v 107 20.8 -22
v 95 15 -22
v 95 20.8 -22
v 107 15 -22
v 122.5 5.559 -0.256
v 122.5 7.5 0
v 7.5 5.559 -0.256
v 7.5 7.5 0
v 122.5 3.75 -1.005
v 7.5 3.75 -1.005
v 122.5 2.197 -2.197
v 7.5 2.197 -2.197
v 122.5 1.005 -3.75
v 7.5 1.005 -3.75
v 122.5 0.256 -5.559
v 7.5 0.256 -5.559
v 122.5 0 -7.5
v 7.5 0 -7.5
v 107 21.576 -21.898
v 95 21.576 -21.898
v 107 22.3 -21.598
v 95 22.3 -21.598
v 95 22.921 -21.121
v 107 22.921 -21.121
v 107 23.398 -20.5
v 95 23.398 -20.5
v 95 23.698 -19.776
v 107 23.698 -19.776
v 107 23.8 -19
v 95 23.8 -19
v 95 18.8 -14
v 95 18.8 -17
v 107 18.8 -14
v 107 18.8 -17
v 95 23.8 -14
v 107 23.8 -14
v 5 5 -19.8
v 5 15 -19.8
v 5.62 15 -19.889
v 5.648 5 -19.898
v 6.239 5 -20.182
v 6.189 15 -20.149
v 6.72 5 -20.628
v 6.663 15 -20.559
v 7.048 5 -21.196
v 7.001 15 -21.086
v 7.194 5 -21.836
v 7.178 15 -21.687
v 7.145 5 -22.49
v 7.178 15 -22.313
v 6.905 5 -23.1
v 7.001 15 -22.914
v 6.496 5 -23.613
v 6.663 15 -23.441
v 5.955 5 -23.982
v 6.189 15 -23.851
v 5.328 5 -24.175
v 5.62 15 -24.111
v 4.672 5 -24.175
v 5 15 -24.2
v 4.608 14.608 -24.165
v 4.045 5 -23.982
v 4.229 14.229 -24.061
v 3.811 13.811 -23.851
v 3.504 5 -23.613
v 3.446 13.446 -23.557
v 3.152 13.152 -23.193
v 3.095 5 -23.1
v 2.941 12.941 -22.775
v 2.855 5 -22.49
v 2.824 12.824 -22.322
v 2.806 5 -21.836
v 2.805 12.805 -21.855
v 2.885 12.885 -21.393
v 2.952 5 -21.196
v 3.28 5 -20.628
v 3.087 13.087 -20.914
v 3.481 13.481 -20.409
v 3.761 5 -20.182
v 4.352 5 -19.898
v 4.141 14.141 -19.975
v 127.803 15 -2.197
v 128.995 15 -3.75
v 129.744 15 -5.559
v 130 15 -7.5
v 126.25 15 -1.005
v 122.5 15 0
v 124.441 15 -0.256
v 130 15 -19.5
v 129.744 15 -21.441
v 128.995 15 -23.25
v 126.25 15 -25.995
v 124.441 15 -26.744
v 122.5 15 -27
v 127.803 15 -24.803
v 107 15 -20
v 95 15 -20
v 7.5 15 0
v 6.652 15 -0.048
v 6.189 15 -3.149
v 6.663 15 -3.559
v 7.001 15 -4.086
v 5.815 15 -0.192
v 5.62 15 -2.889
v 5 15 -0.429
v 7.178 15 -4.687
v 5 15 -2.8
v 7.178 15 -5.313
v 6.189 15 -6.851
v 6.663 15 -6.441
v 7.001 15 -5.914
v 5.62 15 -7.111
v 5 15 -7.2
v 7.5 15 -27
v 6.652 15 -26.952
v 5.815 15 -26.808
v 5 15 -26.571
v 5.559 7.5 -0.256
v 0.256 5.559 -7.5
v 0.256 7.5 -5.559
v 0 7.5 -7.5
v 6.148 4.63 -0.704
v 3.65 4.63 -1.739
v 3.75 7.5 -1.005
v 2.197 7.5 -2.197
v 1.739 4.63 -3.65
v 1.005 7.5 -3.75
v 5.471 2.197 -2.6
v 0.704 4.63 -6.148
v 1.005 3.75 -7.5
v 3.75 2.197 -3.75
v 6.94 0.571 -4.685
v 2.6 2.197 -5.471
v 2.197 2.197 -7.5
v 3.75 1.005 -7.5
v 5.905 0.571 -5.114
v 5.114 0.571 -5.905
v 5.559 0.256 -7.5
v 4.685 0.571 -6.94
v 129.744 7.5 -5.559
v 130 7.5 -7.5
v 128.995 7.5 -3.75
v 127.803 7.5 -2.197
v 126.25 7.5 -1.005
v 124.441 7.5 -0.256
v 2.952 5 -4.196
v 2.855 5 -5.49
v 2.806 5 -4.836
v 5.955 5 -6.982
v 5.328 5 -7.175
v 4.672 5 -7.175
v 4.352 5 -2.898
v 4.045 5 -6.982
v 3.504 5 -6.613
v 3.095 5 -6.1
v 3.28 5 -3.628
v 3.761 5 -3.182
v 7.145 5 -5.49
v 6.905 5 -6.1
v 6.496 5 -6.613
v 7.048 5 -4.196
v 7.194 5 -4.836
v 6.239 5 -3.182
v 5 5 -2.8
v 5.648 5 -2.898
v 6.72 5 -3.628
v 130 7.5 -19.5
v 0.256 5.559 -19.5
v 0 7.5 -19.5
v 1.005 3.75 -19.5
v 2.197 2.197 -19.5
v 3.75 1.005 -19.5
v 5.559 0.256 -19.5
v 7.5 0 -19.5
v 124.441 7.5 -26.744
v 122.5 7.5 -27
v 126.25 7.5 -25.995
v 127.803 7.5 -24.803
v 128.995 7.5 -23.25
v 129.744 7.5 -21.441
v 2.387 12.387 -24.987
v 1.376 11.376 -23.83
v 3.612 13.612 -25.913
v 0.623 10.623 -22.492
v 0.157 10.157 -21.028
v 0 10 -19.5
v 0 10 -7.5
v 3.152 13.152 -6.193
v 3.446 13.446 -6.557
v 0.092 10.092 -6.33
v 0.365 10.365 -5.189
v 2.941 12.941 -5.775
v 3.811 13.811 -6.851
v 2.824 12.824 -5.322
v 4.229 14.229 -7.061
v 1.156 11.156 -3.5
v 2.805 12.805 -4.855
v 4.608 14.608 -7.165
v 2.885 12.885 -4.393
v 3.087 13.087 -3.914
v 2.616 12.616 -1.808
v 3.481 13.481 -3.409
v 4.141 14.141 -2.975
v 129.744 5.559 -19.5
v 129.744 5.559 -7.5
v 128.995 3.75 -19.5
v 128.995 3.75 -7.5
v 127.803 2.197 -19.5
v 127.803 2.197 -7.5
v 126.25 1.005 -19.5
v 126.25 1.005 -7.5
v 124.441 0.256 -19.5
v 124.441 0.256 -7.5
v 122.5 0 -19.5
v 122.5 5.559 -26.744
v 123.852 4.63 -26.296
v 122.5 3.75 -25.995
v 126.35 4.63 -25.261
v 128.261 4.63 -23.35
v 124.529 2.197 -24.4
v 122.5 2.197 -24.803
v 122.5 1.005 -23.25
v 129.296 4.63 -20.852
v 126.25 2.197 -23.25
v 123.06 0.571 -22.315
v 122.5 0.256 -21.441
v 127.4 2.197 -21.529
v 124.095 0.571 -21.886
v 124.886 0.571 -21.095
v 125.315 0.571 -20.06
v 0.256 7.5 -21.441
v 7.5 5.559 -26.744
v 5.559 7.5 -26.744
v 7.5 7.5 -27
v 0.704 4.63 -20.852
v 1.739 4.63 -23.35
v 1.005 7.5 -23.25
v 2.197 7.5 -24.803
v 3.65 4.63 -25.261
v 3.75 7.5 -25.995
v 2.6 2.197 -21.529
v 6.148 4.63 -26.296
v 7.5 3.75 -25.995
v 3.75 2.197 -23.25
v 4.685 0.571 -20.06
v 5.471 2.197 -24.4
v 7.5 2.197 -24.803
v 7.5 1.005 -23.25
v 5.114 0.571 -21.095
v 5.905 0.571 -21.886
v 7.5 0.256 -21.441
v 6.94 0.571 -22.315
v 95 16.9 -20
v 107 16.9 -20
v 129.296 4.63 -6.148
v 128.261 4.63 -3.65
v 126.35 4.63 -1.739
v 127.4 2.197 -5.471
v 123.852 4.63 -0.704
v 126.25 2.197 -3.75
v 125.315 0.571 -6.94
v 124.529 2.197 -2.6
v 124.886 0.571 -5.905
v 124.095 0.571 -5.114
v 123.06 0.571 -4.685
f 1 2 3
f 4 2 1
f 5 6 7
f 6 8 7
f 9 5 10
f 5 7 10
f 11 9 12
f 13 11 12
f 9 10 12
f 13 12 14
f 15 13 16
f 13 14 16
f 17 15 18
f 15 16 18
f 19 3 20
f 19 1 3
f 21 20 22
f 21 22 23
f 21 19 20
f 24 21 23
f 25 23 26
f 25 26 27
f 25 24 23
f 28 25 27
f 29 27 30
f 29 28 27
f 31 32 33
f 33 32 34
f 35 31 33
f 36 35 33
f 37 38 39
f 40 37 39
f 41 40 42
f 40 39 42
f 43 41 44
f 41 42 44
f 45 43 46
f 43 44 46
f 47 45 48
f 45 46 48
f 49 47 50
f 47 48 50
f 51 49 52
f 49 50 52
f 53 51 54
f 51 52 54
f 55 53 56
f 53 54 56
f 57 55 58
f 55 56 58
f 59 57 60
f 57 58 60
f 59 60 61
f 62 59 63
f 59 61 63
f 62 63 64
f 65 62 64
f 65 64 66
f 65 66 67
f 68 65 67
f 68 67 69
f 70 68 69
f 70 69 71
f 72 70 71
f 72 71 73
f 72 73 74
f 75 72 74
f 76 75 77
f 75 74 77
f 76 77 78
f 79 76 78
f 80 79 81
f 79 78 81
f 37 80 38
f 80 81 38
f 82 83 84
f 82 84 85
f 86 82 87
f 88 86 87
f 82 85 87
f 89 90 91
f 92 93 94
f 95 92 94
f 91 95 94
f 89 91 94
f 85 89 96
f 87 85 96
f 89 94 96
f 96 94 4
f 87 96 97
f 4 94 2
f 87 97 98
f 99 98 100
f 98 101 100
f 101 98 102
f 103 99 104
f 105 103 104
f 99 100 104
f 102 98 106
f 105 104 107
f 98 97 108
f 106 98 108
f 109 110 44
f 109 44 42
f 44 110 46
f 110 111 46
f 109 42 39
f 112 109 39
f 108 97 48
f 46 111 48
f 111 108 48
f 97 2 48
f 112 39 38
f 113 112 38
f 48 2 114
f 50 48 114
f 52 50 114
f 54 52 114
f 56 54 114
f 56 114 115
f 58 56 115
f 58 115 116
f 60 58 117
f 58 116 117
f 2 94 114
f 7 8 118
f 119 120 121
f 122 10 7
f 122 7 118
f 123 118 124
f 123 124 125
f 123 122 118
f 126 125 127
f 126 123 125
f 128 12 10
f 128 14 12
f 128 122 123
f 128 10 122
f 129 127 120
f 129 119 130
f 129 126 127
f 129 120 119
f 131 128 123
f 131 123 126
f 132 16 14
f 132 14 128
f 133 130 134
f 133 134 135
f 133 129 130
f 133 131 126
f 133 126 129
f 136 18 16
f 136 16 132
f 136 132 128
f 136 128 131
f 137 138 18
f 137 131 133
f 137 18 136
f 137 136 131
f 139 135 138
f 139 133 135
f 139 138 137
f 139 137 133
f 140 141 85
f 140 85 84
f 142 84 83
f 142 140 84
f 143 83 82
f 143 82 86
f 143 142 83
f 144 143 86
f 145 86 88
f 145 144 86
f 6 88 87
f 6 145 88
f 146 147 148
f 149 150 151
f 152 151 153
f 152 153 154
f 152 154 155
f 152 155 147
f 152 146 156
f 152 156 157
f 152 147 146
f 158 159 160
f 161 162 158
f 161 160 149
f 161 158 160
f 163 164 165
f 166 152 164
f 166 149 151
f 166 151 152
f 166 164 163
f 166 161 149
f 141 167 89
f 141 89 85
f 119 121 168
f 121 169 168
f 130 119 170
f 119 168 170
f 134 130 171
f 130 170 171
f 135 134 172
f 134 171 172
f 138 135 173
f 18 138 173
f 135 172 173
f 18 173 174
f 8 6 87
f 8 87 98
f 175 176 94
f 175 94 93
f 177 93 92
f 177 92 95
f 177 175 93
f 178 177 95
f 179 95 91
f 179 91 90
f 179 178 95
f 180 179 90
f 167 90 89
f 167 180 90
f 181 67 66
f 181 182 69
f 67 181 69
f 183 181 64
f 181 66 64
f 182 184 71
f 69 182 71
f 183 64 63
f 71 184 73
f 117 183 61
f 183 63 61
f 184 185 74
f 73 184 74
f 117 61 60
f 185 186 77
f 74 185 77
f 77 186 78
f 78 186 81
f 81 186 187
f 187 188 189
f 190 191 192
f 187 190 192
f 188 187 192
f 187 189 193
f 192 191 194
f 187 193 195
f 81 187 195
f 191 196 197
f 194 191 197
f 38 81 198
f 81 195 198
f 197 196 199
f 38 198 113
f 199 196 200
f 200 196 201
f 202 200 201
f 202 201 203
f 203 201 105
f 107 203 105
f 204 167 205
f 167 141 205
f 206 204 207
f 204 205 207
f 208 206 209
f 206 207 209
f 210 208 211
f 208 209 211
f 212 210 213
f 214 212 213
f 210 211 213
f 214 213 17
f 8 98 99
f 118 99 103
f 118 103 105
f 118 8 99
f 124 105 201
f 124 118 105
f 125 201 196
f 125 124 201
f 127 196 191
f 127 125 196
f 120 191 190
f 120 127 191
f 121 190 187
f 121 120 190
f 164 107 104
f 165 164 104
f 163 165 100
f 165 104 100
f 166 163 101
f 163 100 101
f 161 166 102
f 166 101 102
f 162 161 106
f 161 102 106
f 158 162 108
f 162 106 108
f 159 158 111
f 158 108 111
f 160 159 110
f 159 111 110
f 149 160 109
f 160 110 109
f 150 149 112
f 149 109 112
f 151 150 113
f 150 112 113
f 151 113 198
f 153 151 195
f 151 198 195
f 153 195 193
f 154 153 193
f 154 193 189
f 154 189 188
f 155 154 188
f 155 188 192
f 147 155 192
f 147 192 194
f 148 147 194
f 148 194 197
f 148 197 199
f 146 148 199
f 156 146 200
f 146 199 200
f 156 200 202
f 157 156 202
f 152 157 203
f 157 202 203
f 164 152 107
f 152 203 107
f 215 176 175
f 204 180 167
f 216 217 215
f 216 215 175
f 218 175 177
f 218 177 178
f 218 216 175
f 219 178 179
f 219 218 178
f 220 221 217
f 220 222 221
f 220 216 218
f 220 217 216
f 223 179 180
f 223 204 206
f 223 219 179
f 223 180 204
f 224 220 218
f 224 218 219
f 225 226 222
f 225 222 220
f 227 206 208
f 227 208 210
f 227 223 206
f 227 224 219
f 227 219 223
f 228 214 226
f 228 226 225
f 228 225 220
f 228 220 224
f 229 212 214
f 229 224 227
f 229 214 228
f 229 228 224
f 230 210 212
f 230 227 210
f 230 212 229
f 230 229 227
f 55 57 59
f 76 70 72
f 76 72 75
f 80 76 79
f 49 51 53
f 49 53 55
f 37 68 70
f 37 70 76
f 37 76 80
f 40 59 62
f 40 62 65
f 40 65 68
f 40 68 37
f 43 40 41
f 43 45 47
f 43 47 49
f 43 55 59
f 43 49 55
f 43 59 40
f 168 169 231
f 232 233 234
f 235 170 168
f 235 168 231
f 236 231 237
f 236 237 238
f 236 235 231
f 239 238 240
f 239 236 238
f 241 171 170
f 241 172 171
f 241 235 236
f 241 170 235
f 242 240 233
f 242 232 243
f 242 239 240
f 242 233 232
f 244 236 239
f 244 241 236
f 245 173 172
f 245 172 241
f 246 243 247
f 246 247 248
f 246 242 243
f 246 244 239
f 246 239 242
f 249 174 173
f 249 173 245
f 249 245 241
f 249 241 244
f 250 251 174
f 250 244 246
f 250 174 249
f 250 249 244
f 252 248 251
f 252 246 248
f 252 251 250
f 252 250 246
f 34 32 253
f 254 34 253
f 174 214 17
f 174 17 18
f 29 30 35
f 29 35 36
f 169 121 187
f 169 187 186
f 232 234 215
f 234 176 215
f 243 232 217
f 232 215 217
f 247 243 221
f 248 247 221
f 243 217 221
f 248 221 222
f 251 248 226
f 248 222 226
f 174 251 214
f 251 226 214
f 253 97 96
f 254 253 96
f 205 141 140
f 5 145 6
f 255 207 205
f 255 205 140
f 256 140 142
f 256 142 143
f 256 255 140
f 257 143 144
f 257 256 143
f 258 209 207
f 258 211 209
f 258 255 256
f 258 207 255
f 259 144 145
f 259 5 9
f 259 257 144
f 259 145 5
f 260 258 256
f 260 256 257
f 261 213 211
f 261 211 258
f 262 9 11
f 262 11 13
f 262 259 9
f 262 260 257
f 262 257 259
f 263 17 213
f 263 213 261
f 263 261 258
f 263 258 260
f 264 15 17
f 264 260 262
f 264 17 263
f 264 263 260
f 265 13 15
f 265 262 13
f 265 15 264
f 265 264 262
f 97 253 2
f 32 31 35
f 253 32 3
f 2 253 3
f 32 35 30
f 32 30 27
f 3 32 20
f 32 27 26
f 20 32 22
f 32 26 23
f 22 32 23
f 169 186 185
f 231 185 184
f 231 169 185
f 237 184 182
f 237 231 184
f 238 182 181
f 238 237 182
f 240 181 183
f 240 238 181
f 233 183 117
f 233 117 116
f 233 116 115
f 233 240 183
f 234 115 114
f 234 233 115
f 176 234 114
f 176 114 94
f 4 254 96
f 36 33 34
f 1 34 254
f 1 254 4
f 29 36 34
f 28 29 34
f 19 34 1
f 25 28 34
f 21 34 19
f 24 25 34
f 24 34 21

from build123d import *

# Parameters (mm, degrees)
BOSS_EXTRUDE1_DEPTH = 15
FILLET1_R           = 7.5
CHAMFER1_SIZE       = 5
SKETCH2_R           = 2.2
CUT_EXTRUDE1_DEPTH  = 10
SKETCH3_W           = 12
SKETCH3_H           = 2
BOSS_EXTRUDE2_DEPTH = 3.8
SKETCH4_W           = 12
SKETCH4_H           = 8
BOSS_EXTRUDE3_DEPTH = 5
FILLET2_R           = 3
BOSS_EXTRUDE4_DEPTH = 12


with BuildPart() as part:
    # Sketch1 → Boss-Extrude1 (new body)
    with BuildSketch(Plane(origin=(0, 0, 0), x_dir=(1, 0, 0), z_dir=(0, 1, 0))):
        with BuildLine():
            Line((7.5, 27), (122.5, 27))
            ThreePointArc((122.5, 27), (127.803300859, 24.803300859), (130, 19.5))
            Line((130, 19.5), (130, 7.5))
            ThreePointArc((130, 7.5), (127.803300859, 2.196699141), (122.5, 0))
            Line((122.5, 0), (7.5, 0))
            ThreePointArc((7.5, 0), (2.196699141, 2.196699141), (0, 7.5))
            Line((0, 7.5), (0, 19.5))
            ThreePointArc((0, 19.5), (2.196699141, 24.803300859), (7.5, 27))
        make_face()
    extrude(amount=BOSS_EXTRUDE1_DEPTH)

    # Fillet1
    fillet1_edges = [part.edges().sort_by_distance(p)[0] for p in [
        (0, 0, -13.5),
        (2.196699141, 0, -24.803300859),
        (65, 0, -27),
        (127.803300859, 0, -24.803300859),
        (130, 0, -13.5),
        (127.803300859, 0, -2.196699141),
        (65, 0, 0),
        (2.196699141, 0, -2.196699141),
    ]]
    fillet(fillet1_edges, radius=FILLET1_R)

    # Chamfer1
    # the kernel refuses this chamfer: 5 mm, written as the material it takes off along each edge
    with BuildSketch(Plane(origin=(0, 15, 5.35841494), x_dir=(-0.02749587661058638, -0.9996219169112968, 0), z_dir=(0, 0, -1))) as chamfer1_piece_1:
        Polygon((CHAMFER1_SIZE * 0.999621916911, -CHAMFER1_SIZE * 0.0274958766106), (-CHAMFER1_SIZE * 0.0274958766106, -CHAMFER1_SIZE * 0.999621916911), (0, 0), align=None)
    extrude(amount=37.71682988, mode=Mode.SUBTRACT)

    # Sketch2 → Cut-Extrude1 (cut)
    with BuildSketch(Plane(origin=(0, 15, 0), x_dir=(1, 0, 0), z_dir=(0, 1, 0))):
        with Locations(Location((5, 22, 0), (0, 0, 270))):
            Circle(SKETCH2_R)
        with Locations(Location((5, 5, 0), (0, 0, 270))):
            Circle(SKETCH2_R)
    extrude(amount=-CUT_EXTRUDE1_DEPTH, mode=Mode.SUBTRACT)

    # Sketch3 → Boss-Extrude2 (add)
    with BuildSketch(Plane(origin=(0, 15, 0), x_dir=(1, 0, 0), z_dir=(0, 1, 0))):
        with Locations((101, 21)):
            Rectangle(SKETCH3_W, SKETCH3_H)
    extrude(amount=BOSS_EXTRUDE2_DEPTH)

    # Sketch4 → Boss-Extrude3 (add)
    with BuildSketch(Plane(origin=(0, 18.8, 0), x_dir=(1, 0, 0), z_dir=(0, 1, 0))):
        with Locations((101, 18)):
            Rectangle(SKETCH4_W, SKETCH4_H)
    extrude(amount=BOSS_EXTRUDE3_DEPTH)

    # Fillet2
    fillet2_edges = [part.edges().sort_by_distance(p)[0] for p in [
        (101, 23.8, -22),
    ]]
    fillet(fillet2_edges, radius=FILLET2_R)

    # Sketch5 → Boss-Extrude4 (add)
    with BuildSketch(Plane.ZY.offset(-95)):
        Polygon((-20, 18.8), (-17, 18.8), (-20, 16.9), align=None)
    extrude(amount=-BOSS_EXTRUDE4_DEPTH)


solid = part.part
